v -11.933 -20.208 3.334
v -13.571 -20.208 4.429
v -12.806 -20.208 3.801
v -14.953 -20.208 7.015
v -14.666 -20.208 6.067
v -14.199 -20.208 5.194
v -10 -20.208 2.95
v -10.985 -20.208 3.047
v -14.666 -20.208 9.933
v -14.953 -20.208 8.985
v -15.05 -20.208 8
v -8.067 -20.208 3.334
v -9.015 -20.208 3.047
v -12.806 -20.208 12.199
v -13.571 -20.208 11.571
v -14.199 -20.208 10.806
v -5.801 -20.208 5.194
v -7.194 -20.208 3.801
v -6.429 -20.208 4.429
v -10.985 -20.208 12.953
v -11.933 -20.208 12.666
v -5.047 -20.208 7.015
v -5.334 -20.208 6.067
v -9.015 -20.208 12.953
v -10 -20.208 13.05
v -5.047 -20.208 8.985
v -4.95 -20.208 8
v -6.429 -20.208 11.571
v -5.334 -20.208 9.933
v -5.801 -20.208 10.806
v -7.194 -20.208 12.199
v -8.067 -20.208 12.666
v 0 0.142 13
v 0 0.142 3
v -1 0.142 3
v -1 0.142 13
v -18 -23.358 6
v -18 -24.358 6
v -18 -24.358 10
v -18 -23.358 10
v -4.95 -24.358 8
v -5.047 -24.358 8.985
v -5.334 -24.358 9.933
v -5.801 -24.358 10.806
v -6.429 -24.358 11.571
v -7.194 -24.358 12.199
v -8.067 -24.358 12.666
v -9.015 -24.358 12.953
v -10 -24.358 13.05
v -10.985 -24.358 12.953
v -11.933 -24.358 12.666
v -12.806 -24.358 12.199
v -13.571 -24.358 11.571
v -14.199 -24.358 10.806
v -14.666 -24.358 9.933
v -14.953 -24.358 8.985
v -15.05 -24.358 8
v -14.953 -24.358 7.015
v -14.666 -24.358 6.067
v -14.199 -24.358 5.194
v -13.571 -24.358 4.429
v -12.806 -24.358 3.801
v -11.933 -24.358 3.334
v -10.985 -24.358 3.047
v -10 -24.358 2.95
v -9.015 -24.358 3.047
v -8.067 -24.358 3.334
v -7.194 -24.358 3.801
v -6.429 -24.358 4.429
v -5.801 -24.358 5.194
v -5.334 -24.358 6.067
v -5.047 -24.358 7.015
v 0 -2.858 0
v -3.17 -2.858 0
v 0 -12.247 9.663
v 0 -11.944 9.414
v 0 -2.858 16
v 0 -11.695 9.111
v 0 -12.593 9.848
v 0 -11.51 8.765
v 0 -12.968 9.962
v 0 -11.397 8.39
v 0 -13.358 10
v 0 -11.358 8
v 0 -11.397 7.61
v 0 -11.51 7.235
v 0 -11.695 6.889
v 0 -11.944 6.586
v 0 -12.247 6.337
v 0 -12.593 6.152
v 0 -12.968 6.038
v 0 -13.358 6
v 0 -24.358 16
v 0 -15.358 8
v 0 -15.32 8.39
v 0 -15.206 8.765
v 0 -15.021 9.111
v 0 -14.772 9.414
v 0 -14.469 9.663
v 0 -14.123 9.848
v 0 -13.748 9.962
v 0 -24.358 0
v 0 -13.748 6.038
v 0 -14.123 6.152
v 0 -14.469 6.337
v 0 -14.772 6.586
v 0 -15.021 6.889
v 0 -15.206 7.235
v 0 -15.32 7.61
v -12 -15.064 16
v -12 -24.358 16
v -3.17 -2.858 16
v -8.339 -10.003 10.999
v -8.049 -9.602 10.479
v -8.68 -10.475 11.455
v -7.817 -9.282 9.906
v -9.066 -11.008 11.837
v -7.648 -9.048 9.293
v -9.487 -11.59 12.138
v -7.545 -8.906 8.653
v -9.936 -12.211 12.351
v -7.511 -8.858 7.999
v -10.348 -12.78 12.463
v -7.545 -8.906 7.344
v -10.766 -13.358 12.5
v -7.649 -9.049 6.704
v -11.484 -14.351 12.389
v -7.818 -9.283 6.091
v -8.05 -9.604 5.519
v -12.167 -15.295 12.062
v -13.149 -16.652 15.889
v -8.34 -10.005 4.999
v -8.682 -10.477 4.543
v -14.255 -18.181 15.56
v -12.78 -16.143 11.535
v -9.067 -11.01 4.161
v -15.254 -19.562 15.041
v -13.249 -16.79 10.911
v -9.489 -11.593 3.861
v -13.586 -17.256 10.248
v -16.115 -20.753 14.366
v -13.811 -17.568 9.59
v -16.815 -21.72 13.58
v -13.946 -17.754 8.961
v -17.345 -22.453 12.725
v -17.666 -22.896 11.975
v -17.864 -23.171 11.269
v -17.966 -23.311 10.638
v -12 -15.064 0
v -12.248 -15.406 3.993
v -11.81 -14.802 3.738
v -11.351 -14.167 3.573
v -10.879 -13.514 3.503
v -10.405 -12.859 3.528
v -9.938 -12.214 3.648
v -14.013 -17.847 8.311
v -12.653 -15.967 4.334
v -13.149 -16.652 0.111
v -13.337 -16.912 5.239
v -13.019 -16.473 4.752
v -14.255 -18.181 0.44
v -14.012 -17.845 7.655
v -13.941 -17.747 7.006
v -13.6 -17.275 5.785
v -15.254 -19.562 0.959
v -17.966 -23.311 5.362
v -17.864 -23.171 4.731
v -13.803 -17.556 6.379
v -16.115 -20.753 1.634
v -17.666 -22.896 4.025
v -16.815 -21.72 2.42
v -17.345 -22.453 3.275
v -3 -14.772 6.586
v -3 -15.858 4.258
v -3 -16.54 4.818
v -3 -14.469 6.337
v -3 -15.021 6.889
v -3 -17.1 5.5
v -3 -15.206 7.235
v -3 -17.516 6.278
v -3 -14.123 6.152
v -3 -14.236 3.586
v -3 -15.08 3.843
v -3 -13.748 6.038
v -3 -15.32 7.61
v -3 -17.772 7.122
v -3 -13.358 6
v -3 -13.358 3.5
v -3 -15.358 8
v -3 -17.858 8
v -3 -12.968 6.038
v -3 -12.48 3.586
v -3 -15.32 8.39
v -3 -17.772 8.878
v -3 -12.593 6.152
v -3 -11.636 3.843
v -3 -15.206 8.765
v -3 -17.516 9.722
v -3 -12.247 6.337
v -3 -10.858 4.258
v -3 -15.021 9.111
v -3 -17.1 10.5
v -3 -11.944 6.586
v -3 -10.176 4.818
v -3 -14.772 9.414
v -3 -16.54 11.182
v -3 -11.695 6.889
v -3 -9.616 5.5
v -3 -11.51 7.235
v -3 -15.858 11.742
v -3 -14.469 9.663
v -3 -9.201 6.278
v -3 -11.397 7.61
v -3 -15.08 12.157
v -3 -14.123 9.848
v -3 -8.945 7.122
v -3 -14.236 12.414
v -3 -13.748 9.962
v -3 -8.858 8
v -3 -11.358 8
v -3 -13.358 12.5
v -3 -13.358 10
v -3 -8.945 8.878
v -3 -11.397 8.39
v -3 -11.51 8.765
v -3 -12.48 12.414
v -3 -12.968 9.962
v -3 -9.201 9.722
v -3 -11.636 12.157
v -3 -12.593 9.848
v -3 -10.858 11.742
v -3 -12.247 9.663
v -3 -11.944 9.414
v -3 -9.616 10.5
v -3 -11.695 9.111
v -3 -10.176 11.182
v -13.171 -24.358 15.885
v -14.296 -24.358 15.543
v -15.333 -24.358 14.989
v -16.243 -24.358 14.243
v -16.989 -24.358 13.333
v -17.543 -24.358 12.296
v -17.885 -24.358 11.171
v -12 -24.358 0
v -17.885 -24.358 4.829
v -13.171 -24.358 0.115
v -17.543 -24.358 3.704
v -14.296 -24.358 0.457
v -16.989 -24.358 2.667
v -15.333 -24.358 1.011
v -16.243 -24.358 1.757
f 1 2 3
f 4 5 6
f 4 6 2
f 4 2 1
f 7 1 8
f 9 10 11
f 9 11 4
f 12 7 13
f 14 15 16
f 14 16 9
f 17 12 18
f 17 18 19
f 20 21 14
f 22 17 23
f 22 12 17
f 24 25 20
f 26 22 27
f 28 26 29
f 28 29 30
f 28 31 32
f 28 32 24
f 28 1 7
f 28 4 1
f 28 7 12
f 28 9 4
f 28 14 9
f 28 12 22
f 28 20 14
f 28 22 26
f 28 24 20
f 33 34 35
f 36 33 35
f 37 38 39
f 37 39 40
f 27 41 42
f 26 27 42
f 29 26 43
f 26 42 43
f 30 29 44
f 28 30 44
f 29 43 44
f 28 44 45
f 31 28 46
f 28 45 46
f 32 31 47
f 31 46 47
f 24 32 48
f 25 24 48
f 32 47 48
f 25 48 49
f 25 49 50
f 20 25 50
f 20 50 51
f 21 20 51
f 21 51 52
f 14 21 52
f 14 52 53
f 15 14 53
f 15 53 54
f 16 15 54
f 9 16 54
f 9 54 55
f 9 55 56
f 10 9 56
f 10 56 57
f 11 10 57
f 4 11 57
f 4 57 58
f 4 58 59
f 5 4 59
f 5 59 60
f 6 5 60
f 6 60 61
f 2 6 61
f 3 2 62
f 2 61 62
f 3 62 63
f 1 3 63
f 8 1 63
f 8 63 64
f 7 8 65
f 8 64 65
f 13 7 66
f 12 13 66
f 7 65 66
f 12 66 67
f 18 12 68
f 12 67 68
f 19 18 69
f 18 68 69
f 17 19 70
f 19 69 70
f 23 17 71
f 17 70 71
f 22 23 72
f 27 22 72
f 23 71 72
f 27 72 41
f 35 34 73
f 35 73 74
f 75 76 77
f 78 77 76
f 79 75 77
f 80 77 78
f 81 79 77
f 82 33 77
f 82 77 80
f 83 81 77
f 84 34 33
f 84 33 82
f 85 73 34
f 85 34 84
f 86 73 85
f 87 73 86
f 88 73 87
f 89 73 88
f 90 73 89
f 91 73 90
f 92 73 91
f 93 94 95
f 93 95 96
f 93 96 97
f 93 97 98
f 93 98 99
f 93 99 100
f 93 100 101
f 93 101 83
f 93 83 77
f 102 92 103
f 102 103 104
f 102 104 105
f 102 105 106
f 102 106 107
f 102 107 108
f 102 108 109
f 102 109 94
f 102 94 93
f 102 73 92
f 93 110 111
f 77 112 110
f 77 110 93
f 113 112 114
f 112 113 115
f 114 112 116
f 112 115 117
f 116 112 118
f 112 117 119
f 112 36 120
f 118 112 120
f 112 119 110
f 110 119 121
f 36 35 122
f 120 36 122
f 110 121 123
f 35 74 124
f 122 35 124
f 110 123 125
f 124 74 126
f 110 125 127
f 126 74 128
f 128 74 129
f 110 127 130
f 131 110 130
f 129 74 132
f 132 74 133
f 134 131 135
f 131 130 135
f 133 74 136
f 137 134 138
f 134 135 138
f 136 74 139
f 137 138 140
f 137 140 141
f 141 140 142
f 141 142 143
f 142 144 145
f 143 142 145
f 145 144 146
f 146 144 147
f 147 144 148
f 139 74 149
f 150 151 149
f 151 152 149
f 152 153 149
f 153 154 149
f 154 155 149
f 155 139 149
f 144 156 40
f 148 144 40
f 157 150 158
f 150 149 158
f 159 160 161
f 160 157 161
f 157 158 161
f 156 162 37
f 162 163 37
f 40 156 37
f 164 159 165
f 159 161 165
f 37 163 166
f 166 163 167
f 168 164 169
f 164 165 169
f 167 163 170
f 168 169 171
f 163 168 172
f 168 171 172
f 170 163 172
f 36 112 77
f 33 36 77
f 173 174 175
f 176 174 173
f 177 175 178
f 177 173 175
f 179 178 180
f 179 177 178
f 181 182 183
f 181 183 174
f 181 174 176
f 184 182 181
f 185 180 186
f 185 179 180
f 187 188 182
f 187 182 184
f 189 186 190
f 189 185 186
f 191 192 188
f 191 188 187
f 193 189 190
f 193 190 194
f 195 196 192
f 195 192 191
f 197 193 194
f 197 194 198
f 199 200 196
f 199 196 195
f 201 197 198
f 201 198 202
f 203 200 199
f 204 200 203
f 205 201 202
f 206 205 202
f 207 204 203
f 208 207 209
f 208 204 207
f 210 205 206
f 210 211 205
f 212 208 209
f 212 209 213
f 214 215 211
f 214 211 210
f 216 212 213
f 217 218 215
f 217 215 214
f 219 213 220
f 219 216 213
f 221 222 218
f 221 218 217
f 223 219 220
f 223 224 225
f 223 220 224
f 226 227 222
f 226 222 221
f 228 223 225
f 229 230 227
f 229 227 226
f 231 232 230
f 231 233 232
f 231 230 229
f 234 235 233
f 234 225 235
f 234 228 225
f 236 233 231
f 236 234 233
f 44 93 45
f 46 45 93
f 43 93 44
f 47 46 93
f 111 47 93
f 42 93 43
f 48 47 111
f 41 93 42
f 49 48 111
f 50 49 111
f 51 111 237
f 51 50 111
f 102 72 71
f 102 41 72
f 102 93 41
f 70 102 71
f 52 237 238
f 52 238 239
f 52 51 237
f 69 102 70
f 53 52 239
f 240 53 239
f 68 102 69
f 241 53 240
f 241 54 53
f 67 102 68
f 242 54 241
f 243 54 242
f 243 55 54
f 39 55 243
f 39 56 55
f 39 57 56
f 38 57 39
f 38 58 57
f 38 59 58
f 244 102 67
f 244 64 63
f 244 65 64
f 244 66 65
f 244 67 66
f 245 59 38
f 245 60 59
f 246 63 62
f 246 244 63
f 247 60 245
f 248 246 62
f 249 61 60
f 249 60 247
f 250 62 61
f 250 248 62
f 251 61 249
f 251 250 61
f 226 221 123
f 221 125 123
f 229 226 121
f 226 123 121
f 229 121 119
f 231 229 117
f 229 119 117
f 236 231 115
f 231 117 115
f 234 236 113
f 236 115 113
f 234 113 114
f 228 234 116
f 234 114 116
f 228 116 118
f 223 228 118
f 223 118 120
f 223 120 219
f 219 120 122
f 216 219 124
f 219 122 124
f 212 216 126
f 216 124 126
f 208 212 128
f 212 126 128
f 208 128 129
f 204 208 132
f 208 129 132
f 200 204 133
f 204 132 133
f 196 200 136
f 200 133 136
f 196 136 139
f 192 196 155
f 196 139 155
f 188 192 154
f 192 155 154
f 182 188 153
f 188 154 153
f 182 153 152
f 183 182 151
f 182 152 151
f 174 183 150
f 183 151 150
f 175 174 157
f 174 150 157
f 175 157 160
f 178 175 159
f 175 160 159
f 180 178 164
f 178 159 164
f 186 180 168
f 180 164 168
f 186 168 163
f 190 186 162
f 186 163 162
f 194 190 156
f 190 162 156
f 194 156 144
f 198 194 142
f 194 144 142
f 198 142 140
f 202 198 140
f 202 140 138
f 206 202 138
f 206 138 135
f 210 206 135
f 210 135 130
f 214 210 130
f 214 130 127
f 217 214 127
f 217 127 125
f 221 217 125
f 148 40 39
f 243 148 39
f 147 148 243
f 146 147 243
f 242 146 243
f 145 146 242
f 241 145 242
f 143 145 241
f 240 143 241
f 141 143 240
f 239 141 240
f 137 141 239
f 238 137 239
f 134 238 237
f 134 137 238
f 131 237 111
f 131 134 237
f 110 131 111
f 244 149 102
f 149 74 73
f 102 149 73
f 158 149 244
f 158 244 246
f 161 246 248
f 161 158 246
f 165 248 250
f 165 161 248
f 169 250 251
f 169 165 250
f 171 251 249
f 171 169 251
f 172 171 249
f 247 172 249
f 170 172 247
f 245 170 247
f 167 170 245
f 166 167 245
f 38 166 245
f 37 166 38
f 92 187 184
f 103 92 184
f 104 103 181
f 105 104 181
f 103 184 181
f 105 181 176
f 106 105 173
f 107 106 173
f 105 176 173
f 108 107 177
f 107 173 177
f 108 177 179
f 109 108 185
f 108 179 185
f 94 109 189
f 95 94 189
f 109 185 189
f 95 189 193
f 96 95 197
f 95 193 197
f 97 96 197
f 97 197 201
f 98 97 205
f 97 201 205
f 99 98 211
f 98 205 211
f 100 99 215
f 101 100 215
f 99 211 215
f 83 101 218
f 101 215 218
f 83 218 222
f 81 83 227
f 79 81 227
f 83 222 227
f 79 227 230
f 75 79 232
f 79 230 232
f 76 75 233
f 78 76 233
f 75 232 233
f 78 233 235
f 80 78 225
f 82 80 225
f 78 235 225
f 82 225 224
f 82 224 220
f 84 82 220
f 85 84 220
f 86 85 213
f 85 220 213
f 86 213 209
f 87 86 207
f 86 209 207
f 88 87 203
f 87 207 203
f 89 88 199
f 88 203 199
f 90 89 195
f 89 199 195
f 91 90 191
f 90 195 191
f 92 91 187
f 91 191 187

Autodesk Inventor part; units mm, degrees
ref_plane "YZ Plane" through (0, 0, 0) normal (1, 0, 0) x (0, 1, 0)
ref_plane "XZ Plane" through (0, 0, 0) normal (0, 1, 0) x (-1, 0, 0)
ref_plane "XY Plane" through (0, 0, 0) normal (0, 0, 1) x (1, 0, 0)
sketch "Szkic1" plane through (0, 0, 0) normal (0, 0, 1) x (1, 0, 0)
  line L0 (0, 0.1419) -> (0, -24.3581)
  line L1 (0, -24.3581) -> (-18, -24.3581)
  line L2 (-18, -24.3581) -> (-18, -23.3581)
  line L3 (0, 0.1419) -> (-1, 0.1419)
  line L4 (-1, 0.1419) -> (-18, -23.3581)
  point P0 (0, 0)
  dimension "d0" = 24.5
  dimension "d1" = 18
  dimension "d2" = 1
  dimension "d3" = 1
extrude "Wyciągnięcie proste1" add sketch "Szkic1" along normal blind 16
sketch "Szkic2" plane through (0, -24.3581, 0) normal (1, 0, 0) x (0, 0, -1)
  line L0 (0, 24.5) -> (0, 0) projected
  line L1 (0, 24.5) -> (-16, 24.5) projected
  line L2 (-16, 0) -> (-16, 24.5) projected
  line L3 (0, 0) -> (-16, 0) projected
  point P0 (0, 24.3581)
  point P1 (-8, 11)
  dimension "d6" = 16
  dimension "d7" = 13.5
  dimension "d8" = 8
hole "Otwór1" at (0, -13.3581, 8) direction (-1, 0, 0) diameter 4 end through all
sketch "Szkic3" plane through (-18, -24.3581, 0) normal (0, -1, 0) x (1, 0, 0)
  line L0 (18, 0) -> (0, 0) projected
  line L1 (18, 0) -> (18, 16) projected
  line L2 (0, 16) -> (18, 16) projected
  line L3 (0, 0) -> (0, 16) projected
  circle A0 centre (8, 8) radius 5.05
  dimension "d16" = 10.1
  dimension "d17" = 10
  dimension "d18" = 16
  dimension "d19" = 8
extrude "Wyciągnięcie proste2" cut sketch "Szkic3" against normal blind 4.15 contours A0
sketch "Szkic4" plane through (-18, -24.3581, 0) normal (-1, 0, 0) x (0, 0, 1)
  circle A0 centre (8, 11) radius 2 projected
  circle A1 centre (8, 11) radius 4.5
  point P0 (0, 24.3581)
  dimension "d22" = 9
extrude "Wyciągnięcie proste3" cut sketch "Szkic4" against normal blind 15
fillet "Zaokrąglenie1" radius 6 2 edges at (-18, -23.8581, 16) (-18, -23.8581, 0)
chamfer "Faza1" distance 3 angle 45 2 edges at (-0.5, 0.1419, 16) (-0.5, 0.1419, 0)
equation "\"d8\" = 0.5 * d6"
equation "\"d19\" = 0.5 * d18"
properties part number "3DP_ABS_Front_Door_Frame_Magnet_Mount"
